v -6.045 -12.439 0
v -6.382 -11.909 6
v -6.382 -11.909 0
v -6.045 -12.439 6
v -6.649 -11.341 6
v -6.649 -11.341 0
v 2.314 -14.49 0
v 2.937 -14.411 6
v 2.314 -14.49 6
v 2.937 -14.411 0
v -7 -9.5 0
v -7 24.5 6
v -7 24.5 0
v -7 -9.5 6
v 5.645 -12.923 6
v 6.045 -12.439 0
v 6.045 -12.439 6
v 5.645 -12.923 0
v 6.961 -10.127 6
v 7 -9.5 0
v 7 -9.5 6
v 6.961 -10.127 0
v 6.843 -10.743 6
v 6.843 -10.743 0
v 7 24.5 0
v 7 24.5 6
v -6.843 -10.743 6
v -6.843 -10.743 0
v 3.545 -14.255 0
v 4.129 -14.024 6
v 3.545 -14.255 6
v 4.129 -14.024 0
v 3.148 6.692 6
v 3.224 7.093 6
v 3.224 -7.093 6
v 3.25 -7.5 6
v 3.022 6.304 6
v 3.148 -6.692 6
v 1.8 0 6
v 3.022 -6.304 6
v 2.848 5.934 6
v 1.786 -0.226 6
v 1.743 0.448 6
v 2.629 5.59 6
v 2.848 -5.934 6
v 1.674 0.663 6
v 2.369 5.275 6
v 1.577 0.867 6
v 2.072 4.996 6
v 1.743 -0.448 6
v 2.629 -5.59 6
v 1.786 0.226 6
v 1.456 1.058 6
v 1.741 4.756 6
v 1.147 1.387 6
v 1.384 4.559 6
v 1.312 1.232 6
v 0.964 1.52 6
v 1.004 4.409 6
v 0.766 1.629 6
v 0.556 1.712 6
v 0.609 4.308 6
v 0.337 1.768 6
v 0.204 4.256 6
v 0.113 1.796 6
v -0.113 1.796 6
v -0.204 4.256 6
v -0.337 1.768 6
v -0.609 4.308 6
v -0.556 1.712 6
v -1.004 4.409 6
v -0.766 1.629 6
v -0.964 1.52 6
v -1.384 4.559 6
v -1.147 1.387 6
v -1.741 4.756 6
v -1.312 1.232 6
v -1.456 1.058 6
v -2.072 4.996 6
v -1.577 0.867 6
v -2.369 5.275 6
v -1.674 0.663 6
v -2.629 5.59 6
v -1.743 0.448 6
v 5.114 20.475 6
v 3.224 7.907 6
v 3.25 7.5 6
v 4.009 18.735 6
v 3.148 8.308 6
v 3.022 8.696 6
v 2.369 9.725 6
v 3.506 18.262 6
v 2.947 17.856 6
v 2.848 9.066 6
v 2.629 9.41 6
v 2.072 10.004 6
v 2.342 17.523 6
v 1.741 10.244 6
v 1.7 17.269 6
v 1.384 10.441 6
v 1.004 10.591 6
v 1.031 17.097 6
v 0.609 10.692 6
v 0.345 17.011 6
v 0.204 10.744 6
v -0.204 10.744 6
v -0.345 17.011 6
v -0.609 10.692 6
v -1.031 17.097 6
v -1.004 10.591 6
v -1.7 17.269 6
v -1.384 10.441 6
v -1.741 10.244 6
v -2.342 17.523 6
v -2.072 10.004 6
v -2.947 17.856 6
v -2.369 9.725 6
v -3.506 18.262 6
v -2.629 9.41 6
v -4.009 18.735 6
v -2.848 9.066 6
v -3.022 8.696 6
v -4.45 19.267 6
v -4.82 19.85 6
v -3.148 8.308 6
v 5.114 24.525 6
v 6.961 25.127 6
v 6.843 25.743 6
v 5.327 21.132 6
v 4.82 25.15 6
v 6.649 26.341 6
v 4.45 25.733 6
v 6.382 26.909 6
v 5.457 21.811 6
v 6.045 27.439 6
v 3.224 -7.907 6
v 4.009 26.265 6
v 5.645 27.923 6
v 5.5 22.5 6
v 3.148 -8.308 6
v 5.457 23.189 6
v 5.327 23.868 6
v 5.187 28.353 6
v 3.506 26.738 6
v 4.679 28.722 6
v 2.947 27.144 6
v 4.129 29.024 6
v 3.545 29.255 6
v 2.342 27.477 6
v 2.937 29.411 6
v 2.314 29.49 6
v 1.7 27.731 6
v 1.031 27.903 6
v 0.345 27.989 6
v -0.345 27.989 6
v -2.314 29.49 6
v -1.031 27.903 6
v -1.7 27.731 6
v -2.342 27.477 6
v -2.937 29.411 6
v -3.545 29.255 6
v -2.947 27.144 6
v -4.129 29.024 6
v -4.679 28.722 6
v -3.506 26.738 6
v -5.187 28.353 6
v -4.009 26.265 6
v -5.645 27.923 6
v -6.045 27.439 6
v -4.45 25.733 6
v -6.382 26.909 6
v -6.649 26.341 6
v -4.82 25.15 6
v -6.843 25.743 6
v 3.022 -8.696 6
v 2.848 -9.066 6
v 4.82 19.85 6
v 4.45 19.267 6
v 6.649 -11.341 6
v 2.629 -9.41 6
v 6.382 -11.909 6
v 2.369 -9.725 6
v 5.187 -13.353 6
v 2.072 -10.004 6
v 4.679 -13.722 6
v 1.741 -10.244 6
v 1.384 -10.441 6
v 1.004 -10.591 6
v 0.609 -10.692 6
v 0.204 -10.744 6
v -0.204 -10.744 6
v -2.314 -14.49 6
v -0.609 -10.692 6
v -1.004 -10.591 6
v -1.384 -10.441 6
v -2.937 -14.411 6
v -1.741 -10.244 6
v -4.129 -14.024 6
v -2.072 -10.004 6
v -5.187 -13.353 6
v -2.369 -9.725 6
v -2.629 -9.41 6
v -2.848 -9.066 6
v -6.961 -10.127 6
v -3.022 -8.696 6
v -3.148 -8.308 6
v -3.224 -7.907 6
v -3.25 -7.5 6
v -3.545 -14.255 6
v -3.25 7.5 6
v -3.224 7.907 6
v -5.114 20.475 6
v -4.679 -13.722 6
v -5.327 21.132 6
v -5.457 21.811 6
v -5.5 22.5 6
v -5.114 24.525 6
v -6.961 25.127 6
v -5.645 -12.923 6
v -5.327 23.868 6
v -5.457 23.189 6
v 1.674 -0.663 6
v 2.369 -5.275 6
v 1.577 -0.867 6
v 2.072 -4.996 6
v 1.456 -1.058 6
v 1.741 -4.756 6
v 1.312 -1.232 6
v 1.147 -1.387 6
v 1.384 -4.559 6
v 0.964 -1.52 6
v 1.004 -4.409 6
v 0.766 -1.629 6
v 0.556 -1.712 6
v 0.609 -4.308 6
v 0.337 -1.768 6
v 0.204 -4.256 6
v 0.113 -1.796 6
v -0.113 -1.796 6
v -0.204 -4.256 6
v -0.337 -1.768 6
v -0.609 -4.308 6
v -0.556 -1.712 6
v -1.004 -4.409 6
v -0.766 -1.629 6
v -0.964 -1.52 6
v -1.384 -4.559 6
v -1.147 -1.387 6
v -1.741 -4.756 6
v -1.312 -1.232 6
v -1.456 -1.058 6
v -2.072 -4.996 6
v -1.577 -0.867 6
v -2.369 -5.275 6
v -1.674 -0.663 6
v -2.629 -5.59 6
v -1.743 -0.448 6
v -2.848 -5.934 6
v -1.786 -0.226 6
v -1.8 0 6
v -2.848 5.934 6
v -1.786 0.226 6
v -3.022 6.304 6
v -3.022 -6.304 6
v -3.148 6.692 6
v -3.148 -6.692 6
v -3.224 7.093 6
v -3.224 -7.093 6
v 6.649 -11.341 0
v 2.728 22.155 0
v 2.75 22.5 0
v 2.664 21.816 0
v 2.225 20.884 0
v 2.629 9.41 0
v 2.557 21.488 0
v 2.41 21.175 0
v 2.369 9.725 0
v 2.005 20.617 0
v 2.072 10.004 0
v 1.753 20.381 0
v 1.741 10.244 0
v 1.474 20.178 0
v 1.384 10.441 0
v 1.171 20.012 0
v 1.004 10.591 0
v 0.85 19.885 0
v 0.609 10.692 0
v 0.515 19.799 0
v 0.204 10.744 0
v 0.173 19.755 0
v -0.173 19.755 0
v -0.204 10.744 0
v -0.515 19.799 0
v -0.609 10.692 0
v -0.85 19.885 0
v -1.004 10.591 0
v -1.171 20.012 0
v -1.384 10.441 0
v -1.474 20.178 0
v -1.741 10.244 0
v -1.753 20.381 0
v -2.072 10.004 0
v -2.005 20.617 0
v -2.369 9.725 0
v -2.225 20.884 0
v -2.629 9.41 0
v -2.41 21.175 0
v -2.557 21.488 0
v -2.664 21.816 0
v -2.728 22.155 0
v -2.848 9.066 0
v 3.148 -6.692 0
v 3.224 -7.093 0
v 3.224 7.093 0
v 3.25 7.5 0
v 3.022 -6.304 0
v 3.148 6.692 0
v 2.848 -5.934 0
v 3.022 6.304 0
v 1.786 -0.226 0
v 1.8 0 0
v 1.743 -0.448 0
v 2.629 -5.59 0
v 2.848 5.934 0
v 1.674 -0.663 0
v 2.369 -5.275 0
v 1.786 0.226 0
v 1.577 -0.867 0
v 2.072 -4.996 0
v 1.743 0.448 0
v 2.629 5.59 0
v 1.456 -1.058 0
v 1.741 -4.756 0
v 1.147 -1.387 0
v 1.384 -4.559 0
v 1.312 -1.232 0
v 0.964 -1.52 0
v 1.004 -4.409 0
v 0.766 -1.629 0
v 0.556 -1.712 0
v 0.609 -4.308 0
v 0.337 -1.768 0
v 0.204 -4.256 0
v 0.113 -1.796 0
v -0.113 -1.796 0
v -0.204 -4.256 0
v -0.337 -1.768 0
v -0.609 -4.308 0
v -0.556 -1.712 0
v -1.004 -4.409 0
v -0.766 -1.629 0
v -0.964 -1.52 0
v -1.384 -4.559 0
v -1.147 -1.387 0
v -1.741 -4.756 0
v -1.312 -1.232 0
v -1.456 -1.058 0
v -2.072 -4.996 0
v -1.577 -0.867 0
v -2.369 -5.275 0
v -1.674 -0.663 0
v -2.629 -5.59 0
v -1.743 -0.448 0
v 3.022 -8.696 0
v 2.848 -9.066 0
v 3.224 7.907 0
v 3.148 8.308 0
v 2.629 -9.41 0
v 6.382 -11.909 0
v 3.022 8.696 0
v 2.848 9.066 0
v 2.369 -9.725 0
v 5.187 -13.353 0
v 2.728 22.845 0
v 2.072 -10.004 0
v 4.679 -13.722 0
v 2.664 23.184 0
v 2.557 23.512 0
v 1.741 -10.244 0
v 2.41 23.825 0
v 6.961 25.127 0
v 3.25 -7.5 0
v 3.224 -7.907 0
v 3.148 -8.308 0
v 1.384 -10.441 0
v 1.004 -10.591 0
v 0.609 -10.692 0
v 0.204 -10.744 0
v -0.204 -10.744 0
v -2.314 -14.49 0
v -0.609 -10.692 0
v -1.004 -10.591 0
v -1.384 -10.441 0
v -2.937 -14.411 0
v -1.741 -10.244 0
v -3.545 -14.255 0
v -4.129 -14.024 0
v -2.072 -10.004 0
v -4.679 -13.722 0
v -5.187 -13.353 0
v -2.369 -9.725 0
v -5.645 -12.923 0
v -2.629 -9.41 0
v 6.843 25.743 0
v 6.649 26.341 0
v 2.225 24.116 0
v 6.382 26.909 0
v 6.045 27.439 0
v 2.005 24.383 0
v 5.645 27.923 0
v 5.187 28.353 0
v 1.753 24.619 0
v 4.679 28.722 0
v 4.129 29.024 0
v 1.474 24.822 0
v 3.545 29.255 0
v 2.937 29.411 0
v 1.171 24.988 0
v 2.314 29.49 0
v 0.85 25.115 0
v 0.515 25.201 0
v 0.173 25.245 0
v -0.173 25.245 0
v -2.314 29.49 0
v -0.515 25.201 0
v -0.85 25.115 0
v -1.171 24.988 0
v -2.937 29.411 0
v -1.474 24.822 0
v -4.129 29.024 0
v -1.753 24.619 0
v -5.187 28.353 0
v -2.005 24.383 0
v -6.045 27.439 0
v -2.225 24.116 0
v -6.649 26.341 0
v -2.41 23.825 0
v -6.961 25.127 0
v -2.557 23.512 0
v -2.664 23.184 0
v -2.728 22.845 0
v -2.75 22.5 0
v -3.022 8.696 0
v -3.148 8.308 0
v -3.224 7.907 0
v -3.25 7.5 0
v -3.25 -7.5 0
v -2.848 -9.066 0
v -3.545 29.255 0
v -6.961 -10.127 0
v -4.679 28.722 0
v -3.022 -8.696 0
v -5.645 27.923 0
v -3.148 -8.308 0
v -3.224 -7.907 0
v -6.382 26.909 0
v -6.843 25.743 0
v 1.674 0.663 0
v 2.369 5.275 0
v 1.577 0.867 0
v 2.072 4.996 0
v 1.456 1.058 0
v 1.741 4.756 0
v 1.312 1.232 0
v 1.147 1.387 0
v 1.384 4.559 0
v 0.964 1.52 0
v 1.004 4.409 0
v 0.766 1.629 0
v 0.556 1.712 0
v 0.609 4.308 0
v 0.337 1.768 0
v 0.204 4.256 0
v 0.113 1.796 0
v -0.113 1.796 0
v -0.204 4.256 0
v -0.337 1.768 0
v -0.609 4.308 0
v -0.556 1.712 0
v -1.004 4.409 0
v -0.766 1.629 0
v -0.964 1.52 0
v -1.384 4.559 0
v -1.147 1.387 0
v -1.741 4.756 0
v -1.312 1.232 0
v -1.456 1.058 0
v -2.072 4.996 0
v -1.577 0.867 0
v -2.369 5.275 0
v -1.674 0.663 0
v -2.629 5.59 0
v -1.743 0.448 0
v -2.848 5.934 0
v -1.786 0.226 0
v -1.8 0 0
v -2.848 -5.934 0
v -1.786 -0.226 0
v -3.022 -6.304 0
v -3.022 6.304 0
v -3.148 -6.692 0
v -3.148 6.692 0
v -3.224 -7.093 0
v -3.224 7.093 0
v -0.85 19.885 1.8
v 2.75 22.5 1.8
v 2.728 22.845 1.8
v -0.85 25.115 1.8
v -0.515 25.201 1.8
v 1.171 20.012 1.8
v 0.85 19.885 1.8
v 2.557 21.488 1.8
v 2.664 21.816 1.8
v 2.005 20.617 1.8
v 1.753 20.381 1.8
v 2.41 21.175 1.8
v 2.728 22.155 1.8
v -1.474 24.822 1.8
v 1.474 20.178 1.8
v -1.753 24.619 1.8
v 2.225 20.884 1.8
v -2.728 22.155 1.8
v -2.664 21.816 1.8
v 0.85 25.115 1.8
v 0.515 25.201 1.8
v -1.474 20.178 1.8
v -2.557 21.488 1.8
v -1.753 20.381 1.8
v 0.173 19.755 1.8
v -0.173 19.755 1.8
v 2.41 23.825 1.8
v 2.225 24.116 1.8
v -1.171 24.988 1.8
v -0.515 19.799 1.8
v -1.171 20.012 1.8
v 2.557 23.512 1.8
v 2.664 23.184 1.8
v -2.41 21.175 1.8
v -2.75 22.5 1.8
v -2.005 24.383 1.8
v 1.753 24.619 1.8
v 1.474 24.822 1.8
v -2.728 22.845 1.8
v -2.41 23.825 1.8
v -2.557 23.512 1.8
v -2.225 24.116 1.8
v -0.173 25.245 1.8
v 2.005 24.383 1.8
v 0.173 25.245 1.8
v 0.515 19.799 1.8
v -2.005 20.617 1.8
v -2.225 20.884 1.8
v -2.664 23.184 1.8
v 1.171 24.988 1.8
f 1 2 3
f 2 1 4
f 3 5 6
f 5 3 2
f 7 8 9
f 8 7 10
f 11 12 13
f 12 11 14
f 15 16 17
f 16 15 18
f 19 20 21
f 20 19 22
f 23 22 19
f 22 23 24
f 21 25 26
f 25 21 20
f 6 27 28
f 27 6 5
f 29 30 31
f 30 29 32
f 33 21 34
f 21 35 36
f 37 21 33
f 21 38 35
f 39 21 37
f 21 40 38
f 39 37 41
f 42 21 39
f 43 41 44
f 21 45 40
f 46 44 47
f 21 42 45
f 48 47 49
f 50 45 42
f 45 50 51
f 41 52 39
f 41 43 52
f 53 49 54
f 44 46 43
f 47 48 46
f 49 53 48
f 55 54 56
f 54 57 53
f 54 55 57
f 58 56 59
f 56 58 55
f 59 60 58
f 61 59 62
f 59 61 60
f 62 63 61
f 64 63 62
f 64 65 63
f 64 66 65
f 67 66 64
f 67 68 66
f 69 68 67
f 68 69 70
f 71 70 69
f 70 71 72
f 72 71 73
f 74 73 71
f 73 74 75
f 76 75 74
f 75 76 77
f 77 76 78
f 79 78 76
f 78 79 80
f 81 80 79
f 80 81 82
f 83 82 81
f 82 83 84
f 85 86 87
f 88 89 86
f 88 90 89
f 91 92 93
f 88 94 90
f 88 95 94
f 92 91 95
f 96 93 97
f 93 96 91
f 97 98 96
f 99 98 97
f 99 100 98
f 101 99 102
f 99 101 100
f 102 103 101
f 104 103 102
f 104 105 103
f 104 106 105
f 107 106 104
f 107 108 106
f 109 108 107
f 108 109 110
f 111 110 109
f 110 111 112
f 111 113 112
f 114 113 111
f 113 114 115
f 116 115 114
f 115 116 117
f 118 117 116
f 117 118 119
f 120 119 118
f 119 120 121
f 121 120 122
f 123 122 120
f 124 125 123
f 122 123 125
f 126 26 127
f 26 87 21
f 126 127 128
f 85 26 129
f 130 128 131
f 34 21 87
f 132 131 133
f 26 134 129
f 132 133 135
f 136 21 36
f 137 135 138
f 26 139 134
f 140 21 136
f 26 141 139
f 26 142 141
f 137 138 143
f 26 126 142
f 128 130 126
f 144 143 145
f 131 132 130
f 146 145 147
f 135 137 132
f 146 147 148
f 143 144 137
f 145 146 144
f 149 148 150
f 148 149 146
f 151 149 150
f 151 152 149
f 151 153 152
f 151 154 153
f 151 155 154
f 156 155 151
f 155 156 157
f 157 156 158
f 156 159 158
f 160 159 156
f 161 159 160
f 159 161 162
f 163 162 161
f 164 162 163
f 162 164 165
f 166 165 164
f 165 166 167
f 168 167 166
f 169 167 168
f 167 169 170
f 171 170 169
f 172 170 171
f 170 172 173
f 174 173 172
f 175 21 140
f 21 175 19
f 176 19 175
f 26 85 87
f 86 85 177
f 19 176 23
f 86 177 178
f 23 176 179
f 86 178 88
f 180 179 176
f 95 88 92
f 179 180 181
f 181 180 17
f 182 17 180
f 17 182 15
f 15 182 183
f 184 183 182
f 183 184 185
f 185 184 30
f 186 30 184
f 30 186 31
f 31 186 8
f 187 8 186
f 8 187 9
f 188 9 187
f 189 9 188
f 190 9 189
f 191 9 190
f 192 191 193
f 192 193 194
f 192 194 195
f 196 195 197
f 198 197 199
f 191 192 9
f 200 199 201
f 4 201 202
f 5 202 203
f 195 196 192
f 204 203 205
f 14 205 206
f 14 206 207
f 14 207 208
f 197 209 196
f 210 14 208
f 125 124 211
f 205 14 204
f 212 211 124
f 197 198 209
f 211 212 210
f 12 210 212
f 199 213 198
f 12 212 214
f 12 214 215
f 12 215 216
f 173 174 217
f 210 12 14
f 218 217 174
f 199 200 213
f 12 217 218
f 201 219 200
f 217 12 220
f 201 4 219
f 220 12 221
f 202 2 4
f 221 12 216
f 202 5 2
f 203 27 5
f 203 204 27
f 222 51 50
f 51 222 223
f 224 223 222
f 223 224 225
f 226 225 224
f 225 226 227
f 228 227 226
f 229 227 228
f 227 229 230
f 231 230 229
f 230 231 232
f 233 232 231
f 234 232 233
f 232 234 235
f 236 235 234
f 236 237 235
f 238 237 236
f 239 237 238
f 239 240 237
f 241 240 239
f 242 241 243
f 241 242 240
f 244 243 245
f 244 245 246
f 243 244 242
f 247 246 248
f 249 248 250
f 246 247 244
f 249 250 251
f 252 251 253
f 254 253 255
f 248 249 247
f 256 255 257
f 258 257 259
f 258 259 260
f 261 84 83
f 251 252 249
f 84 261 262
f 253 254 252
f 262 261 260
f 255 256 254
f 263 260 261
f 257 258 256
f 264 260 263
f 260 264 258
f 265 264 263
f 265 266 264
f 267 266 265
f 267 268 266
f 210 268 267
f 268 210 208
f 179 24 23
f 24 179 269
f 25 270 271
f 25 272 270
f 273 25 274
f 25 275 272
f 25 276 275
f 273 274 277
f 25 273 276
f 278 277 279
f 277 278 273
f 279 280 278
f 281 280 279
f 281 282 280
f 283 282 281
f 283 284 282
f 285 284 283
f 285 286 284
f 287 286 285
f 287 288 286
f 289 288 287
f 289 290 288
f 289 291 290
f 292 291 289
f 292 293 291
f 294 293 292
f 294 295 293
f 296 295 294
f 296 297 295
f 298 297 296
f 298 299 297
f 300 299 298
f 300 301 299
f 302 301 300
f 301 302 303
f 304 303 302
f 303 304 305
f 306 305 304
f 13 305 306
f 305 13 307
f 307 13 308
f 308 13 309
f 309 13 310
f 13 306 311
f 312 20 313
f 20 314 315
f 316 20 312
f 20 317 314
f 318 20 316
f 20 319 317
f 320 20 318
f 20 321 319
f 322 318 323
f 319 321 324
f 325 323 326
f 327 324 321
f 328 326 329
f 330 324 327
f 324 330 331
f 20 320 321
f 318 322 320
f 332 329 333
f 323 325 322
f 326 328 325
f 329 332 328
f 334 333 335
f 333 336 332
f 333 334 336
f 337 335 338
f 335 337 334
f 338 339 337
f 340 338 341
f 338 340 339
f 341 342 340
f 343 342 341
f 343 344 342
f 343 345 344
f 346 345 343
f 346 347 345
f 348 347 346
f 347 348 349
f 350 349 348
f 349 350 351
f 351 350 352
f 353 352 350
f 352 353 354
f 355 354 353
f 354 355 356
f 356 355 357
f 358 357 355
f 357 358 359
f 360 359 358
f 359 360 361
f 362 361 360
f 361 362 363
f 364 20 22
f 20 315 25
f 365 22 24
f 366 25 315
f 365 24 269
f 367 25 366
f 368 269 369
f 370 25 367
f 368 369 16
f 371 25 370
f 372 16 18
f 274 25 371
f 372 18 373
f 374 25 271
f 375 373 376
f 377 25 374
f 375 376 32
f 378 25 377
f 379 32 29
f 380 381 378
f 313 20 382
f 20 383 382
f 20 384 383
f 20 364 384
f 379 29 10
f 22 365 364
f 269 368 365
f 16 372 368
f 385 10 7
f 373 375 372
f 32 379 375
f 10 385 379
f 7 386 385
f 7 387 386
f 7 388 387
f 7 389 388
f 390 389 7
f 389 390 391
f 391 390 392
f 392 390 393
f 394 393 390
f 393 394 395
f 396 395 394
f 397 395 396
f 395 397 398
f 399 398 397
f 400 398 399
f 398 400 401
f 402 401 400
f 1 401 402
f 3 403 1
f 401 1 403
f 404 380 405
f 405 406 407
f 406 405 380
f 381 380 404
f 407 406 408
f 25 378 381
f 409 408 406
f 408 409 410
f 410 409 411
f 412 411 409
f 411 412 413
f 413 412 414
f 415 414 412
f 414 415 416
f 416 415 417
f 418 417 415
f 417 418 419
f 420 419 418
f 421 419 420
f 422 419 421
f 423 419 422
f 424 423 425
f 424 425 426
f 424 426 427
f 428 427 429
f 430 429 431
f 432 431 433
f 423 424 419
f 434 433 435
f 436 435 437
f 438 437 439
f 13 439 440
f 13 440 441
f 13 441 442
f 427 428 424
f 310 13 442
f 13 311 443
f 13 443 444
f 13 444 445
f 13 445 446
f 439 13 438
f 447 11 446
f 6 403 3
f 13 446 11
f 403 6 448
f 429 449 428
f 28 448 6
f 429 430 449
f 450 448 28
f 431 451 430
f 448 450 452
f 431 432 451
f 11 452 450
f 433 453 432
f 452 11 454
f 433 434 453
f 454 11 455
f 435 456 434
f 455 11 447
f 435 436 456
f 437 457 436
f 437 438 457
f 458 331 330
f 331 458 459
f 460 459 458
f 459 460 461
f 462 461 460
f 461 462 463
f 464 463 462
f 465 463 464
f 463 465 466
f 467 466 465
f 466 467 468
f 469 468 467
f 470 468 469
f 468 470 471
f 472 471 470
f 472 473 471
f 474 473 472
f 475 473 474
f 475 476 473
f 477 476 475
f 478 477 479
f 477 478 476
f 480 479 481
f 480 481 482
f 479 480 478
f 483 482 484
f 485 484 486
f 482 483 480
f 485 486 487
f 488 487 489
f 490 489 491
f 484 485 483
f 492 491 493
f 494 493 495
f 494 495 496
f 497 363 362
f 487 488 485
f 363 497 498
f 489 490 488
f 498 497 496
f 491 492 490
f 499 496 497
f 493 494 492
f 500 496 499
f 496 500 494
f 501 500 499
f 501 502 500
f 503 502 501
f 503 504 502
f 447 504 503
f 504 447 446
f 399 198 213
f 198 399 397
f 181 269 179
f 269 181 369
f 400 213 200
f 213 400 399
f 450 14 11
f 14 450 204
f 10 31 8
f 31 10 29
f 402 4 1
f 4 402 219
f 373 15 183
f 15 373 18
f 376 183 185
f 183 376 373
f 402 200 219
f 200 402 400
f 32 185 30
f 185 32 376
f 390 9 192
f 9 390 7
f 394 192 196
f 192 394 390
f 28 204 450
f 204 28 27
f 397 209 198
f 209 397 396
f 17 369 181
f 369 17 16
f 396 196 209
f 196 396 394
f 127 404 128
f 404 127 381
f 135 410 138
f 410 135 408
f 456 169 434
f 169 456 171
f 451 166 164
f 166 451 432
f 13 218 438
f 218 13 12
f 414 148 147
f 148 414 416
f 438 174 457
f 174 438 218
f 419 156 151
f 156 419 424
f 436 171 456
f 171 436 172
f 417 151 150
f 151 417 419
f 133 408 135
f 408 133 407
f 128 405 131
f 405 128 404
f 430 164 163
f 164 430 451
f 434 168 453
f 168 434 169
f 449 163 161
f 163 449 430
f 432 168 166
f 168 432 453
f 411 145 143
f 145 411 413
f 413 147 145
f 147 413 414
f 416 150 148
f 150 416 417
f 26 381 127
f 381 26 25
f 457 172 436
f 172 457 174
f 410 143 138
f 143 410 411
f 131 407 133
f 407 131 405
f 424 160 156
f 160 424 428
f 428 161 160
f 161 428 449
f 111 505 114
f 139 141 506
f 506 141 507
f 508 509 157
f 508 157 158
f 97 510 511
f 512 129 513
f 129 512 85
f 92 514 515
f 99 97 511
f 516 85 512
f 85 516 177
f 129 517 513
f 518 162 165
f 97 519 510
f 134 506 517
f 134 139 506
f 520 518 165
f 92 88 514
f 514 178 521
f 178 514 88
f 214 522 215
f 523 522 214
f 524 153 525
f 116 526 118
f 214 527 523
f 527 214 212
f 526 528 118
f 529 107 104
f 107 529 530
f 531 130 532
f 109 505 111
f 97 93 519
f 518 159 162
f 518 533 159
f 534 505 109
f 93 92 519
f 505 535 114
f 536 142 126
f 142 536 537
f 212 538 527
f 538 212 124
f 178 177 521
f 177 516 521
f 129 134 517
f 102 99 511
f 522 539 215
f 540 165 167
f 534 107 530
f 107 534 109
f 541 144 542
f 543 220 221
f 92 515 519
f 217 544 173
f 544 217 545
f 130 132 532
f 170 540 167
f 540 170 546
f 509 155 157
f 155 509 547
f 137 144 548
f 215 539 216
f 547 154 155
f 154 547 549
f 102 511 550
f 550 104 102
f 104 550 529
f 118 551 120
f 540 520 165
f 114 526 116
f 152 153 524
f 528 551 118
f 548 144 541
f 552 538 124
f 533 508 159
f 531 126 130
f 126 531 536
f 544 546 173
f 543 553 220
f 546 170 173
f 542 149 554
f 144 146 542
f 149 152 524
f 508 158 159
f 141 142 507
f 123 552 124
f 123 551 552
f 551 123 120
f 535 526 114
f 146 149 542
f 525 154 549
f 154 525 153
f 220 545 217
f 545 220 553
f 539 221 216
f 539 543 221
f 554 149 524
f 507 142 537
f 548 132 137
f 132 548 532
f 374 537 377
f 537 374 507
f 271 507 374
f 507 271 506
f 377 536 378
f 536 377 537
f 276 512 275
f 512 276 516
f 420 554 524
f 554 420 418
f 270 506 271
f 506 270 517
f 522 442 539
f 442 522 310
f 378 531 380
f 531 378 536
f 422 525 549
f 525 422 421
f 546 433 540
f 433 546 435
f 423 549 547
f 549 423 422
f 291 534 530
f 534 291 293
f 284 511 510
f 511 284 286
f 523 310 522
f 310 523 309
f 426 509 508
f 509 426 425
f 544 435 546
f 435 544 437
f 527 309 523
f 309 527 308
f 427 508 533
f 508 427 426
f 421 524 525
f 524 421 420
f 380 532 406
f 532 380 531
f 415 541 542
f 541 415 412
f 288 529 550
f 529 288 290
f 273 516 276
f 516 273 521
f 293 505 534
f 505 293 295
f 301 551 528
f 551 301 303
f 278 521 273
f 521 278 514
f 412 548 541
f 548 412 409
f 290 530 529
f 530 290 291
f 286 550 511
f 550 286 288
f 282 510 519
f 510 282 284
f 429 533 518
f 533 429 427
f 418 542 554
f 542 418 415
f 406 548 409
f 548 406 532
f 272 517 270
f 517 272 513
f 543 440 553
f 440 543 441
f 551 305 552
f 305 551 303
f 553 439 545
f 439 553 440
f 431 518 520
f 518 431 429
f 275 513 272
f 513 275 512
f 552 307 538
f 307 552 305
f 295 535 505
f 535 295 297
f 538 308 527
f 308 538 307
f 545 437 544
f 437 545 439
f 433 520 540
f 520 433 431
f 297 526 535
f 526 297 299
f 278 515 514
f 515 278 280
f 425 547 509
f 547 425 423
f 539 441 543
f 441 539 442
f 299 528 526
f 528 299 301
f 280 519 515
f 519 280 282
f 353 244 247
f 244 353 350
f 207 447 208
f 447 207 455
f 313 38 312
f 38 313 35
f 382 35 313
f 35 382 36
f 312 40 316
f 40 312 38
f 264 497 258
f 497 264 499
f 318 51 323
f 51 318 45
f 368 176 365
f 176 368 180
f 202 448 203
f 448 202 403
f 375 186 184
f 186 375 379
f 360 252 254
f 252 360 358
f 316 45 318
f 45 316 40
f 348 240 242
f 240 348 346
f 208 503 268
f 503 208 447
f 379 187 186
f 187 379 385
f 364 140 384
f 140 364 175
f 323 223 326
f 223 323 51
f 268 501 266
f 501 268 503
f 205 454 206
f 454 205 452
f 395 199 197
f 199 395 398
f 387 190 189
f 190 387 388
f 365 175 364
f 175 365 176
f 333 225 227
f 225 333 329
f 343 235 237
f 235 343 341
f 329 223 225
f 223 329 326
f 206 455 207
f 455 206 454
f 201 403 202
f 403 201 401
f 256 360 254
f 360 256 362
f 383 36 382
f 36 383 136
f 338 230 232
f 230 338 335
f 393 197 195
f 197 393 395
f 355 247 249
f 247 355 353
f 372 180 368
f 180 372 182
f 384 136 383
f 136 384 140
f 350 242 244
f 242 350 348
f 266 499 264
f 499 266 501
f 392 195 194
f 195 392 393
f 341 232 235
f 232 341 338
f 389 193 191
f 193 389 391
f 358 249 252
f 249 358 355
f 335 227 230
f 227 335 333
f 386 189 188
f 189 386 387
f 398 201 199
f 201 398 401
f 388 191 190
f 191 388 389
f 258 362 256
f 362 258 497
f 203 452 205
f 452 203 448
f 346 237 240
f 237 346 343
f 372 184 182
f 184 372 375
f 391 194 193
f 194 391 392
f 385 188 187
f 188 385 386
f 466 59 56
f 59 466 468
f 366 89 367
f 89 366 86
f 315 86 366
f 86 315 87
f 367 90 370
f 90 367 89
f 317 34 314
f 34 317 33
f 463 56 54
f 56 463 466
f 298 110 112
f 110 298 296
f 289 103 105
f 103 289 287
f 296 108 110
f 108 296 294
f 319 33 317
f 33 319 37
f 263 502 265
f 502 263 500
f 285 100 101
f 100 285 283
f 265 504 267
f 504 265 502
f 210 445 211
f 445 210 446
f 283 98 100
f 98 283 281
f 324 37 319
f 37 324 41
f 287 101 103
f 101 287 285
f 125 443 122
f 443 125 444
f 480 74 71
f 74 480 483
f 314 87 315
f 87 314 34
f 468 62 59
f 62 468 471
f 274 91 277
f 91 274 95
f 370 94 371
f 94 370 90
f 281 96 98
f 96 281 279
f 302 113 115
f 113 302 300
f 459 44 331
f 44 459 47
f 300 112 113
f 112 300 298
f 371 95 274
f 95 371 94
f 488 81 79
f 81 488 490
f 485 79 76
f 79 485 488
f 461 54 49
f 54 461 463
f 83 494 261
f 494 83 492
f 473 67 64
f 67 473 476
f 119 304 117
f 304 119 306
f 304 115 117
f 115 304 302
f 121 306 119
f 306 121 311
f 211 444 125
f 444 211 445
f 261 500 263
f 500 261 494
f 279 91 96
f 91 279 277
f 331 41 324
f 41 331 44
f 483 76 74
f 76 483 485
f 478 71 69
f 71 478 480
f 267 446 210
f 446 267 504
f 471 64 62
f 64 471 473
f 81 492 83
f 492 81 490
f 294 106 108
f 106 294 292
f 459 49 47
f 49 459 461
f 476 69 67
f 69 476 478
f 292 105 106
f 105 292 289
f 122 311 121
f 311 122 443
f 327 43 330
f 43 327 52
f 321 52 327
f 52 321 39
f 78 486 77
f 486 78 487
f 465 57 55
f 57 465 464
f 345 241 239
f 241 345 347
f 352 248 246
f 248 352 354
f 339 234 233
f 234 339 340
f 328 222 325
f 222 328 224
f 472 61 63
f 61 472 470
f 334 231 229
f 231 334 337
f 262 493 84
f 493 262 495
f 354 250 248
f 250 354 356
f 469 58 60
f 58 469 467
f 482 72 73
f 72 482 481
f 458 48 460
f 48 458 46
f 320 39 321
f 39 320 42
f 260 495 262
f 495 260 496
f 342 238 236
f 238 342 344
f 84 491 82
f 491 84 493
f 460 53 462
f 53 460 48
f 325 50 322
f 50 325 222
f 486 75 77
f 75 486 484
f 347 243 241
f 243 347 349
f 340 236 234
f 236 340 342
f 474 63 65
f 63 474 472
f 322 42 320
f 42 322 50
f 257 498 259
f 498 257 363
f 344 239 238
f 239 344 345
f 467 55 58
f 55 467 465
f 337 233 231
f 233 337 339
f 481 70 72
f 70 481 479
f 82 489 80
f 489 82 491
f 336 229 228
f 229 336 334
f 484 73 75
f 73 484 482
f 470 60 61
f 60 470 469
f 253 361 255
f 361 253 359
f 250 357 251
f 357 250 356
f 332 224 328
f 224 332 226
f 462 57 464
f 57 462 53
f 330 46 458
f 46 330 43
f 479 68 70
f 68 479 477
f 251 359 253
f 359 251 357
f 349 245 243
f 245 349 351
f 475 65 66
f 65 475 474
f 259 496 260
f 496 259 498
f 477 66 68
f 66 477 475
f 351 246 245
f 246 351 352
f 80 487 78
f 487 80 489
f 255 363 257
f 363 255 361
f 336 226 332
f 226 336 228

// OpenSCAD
$fn = 50;


difference() {
	union() {
		hull() {
			translate(v = [-2.0000000000, 9.5000000000, 0]) {
				cylinder(h = 6, r = 5);
			}
			translate(v = [2.0000000000, 9.5000000000, 0]) {
				cylinder(h = 6, r = 5);
			}
			translate(v = [-2.0000000000, -9.5000000000, 0]) {
				cylinder(h = 6, r = 5);
			}
			translate(v = [2.0000000000, -9.5000000000, 0]) {
				cylinder(h = 6, r = 5);
			}
		}
		translate(v = [0.0000000000, 15.0000000000, 0]) {
			hull() {
				translate(v = [-2.0000000000, 9.5000000000, 0]) {
					cylinder(h = 6, r = 5);
				}
				translate(v = [2.0000000000, 9.5000000000, 0]) {
					cylinder(h = 6, r = 5);
				}
				translate(v = [-2.0000000000, -9.5000000000, 0]) {
					cylinder(h = 6, r = 5);
				}
				translate(v = [2.0000000000, -9.5000000000, 0]) {
					cylinder(h = 6, r = 5);
				}
			}
		}
		translate(v = [0.0000000000, 15.0000000000, 0]) {
			hull() {
				translate(v = [-2.0000000000, 9.5000000000, 0]) {
					cylinder(h = 6, r = 5);
				}
				translate(v = [2.0000000000, 9.5000000000, 0]) {
					cylinder(h = 6, r = 5);
				}
				translate(v = [-2.0000000000, -9.5000000000, 0]) {
					cylinder(h = 6, r = 5);
				}
				translate(v = [2.0000000000, -9.5000000000, 0]) {
					cylinder(h = 6, r = 5);
				}
			}
		}
	}
	union() {
		translate(v = [0.0000000000, 22.5000000000, 6]) {
			rotate(a = [0, 0, 0]) {
				difference() {
					union() {
						#translate(v = [0, 0, -6.0000000000]) {
							cylinder(h = 6, r = 2.2500000000);
						}
						#translate(v = [0, 0, -4.2000000000]) {
							cylinder(h = 4.2000000000, r1 = 2.7500000000, r2 = 5.5000000000);
						}
						#translate(v = [0, 0, -6.0000000000]) {
							cylinder(h = 6, r = 2.7500000000);
						}
						#translate(v = [0, 0, -6.0000000000]) {
							cylinder(h = 6, r = 2.2500000000);
						}
					}
					union();
				}
			}
		}
		translate(v = [0.0000000000, 22.5000000000, 6]) {
			rotate(a = [0, 0, 0]) {
				difference() {
					union() {
						#translate(v = [0, 0, -6.0000000000]) {
							cylinder(h = 6, r = 2.2500000000);
						}
						#translate(v = [0, 0, -4.2000000000]) {
							cylinder(h = 4.2000000000, r1 = 2.7500000000, r2 = 5.5000000000);
						}
						#translate(v = [0, 0, -6.0000000000]) {
							cylinder(h = 6, r = 2.7500000000);
						}
						#translate(v = [0, 0, -6.0000000000]) {
							cylinder(h = 6, r = 2.2500000000);
						}
					}
					union();
				}
			}
		}
		translate(v = [0.0000000000, -7.5000000000, 0]) {
			translate(v = [0, 0, -100]) {
				cylinder(h = 200, r = 3.2500000000);
			}
		}
		translate(v = [0.0000000000, 7.5000000000, 0]) {
			translate(v = [0, 0, -100]) {
				cylinder(h = 200, r = 3.2500000000);
			}
		}
		translate(v = [0.0000000000, -7.5000000000, 0]) {
			translate(v = [0, 0, -100]) {
				cylinder(h = 200, r = 1.8000000000);
			}
		}
		translate(v = [0, 0, -100]) {
			cylinder(h = 200, r = 1.8000000000);
		}
		translate(v = [0.0000000000, 7.5000000000, 0]) {
			translate(v = [0, 0, -100]) {
				cylinder(h = 200, r = 1.8000000000);
			}
		}
	}
}
